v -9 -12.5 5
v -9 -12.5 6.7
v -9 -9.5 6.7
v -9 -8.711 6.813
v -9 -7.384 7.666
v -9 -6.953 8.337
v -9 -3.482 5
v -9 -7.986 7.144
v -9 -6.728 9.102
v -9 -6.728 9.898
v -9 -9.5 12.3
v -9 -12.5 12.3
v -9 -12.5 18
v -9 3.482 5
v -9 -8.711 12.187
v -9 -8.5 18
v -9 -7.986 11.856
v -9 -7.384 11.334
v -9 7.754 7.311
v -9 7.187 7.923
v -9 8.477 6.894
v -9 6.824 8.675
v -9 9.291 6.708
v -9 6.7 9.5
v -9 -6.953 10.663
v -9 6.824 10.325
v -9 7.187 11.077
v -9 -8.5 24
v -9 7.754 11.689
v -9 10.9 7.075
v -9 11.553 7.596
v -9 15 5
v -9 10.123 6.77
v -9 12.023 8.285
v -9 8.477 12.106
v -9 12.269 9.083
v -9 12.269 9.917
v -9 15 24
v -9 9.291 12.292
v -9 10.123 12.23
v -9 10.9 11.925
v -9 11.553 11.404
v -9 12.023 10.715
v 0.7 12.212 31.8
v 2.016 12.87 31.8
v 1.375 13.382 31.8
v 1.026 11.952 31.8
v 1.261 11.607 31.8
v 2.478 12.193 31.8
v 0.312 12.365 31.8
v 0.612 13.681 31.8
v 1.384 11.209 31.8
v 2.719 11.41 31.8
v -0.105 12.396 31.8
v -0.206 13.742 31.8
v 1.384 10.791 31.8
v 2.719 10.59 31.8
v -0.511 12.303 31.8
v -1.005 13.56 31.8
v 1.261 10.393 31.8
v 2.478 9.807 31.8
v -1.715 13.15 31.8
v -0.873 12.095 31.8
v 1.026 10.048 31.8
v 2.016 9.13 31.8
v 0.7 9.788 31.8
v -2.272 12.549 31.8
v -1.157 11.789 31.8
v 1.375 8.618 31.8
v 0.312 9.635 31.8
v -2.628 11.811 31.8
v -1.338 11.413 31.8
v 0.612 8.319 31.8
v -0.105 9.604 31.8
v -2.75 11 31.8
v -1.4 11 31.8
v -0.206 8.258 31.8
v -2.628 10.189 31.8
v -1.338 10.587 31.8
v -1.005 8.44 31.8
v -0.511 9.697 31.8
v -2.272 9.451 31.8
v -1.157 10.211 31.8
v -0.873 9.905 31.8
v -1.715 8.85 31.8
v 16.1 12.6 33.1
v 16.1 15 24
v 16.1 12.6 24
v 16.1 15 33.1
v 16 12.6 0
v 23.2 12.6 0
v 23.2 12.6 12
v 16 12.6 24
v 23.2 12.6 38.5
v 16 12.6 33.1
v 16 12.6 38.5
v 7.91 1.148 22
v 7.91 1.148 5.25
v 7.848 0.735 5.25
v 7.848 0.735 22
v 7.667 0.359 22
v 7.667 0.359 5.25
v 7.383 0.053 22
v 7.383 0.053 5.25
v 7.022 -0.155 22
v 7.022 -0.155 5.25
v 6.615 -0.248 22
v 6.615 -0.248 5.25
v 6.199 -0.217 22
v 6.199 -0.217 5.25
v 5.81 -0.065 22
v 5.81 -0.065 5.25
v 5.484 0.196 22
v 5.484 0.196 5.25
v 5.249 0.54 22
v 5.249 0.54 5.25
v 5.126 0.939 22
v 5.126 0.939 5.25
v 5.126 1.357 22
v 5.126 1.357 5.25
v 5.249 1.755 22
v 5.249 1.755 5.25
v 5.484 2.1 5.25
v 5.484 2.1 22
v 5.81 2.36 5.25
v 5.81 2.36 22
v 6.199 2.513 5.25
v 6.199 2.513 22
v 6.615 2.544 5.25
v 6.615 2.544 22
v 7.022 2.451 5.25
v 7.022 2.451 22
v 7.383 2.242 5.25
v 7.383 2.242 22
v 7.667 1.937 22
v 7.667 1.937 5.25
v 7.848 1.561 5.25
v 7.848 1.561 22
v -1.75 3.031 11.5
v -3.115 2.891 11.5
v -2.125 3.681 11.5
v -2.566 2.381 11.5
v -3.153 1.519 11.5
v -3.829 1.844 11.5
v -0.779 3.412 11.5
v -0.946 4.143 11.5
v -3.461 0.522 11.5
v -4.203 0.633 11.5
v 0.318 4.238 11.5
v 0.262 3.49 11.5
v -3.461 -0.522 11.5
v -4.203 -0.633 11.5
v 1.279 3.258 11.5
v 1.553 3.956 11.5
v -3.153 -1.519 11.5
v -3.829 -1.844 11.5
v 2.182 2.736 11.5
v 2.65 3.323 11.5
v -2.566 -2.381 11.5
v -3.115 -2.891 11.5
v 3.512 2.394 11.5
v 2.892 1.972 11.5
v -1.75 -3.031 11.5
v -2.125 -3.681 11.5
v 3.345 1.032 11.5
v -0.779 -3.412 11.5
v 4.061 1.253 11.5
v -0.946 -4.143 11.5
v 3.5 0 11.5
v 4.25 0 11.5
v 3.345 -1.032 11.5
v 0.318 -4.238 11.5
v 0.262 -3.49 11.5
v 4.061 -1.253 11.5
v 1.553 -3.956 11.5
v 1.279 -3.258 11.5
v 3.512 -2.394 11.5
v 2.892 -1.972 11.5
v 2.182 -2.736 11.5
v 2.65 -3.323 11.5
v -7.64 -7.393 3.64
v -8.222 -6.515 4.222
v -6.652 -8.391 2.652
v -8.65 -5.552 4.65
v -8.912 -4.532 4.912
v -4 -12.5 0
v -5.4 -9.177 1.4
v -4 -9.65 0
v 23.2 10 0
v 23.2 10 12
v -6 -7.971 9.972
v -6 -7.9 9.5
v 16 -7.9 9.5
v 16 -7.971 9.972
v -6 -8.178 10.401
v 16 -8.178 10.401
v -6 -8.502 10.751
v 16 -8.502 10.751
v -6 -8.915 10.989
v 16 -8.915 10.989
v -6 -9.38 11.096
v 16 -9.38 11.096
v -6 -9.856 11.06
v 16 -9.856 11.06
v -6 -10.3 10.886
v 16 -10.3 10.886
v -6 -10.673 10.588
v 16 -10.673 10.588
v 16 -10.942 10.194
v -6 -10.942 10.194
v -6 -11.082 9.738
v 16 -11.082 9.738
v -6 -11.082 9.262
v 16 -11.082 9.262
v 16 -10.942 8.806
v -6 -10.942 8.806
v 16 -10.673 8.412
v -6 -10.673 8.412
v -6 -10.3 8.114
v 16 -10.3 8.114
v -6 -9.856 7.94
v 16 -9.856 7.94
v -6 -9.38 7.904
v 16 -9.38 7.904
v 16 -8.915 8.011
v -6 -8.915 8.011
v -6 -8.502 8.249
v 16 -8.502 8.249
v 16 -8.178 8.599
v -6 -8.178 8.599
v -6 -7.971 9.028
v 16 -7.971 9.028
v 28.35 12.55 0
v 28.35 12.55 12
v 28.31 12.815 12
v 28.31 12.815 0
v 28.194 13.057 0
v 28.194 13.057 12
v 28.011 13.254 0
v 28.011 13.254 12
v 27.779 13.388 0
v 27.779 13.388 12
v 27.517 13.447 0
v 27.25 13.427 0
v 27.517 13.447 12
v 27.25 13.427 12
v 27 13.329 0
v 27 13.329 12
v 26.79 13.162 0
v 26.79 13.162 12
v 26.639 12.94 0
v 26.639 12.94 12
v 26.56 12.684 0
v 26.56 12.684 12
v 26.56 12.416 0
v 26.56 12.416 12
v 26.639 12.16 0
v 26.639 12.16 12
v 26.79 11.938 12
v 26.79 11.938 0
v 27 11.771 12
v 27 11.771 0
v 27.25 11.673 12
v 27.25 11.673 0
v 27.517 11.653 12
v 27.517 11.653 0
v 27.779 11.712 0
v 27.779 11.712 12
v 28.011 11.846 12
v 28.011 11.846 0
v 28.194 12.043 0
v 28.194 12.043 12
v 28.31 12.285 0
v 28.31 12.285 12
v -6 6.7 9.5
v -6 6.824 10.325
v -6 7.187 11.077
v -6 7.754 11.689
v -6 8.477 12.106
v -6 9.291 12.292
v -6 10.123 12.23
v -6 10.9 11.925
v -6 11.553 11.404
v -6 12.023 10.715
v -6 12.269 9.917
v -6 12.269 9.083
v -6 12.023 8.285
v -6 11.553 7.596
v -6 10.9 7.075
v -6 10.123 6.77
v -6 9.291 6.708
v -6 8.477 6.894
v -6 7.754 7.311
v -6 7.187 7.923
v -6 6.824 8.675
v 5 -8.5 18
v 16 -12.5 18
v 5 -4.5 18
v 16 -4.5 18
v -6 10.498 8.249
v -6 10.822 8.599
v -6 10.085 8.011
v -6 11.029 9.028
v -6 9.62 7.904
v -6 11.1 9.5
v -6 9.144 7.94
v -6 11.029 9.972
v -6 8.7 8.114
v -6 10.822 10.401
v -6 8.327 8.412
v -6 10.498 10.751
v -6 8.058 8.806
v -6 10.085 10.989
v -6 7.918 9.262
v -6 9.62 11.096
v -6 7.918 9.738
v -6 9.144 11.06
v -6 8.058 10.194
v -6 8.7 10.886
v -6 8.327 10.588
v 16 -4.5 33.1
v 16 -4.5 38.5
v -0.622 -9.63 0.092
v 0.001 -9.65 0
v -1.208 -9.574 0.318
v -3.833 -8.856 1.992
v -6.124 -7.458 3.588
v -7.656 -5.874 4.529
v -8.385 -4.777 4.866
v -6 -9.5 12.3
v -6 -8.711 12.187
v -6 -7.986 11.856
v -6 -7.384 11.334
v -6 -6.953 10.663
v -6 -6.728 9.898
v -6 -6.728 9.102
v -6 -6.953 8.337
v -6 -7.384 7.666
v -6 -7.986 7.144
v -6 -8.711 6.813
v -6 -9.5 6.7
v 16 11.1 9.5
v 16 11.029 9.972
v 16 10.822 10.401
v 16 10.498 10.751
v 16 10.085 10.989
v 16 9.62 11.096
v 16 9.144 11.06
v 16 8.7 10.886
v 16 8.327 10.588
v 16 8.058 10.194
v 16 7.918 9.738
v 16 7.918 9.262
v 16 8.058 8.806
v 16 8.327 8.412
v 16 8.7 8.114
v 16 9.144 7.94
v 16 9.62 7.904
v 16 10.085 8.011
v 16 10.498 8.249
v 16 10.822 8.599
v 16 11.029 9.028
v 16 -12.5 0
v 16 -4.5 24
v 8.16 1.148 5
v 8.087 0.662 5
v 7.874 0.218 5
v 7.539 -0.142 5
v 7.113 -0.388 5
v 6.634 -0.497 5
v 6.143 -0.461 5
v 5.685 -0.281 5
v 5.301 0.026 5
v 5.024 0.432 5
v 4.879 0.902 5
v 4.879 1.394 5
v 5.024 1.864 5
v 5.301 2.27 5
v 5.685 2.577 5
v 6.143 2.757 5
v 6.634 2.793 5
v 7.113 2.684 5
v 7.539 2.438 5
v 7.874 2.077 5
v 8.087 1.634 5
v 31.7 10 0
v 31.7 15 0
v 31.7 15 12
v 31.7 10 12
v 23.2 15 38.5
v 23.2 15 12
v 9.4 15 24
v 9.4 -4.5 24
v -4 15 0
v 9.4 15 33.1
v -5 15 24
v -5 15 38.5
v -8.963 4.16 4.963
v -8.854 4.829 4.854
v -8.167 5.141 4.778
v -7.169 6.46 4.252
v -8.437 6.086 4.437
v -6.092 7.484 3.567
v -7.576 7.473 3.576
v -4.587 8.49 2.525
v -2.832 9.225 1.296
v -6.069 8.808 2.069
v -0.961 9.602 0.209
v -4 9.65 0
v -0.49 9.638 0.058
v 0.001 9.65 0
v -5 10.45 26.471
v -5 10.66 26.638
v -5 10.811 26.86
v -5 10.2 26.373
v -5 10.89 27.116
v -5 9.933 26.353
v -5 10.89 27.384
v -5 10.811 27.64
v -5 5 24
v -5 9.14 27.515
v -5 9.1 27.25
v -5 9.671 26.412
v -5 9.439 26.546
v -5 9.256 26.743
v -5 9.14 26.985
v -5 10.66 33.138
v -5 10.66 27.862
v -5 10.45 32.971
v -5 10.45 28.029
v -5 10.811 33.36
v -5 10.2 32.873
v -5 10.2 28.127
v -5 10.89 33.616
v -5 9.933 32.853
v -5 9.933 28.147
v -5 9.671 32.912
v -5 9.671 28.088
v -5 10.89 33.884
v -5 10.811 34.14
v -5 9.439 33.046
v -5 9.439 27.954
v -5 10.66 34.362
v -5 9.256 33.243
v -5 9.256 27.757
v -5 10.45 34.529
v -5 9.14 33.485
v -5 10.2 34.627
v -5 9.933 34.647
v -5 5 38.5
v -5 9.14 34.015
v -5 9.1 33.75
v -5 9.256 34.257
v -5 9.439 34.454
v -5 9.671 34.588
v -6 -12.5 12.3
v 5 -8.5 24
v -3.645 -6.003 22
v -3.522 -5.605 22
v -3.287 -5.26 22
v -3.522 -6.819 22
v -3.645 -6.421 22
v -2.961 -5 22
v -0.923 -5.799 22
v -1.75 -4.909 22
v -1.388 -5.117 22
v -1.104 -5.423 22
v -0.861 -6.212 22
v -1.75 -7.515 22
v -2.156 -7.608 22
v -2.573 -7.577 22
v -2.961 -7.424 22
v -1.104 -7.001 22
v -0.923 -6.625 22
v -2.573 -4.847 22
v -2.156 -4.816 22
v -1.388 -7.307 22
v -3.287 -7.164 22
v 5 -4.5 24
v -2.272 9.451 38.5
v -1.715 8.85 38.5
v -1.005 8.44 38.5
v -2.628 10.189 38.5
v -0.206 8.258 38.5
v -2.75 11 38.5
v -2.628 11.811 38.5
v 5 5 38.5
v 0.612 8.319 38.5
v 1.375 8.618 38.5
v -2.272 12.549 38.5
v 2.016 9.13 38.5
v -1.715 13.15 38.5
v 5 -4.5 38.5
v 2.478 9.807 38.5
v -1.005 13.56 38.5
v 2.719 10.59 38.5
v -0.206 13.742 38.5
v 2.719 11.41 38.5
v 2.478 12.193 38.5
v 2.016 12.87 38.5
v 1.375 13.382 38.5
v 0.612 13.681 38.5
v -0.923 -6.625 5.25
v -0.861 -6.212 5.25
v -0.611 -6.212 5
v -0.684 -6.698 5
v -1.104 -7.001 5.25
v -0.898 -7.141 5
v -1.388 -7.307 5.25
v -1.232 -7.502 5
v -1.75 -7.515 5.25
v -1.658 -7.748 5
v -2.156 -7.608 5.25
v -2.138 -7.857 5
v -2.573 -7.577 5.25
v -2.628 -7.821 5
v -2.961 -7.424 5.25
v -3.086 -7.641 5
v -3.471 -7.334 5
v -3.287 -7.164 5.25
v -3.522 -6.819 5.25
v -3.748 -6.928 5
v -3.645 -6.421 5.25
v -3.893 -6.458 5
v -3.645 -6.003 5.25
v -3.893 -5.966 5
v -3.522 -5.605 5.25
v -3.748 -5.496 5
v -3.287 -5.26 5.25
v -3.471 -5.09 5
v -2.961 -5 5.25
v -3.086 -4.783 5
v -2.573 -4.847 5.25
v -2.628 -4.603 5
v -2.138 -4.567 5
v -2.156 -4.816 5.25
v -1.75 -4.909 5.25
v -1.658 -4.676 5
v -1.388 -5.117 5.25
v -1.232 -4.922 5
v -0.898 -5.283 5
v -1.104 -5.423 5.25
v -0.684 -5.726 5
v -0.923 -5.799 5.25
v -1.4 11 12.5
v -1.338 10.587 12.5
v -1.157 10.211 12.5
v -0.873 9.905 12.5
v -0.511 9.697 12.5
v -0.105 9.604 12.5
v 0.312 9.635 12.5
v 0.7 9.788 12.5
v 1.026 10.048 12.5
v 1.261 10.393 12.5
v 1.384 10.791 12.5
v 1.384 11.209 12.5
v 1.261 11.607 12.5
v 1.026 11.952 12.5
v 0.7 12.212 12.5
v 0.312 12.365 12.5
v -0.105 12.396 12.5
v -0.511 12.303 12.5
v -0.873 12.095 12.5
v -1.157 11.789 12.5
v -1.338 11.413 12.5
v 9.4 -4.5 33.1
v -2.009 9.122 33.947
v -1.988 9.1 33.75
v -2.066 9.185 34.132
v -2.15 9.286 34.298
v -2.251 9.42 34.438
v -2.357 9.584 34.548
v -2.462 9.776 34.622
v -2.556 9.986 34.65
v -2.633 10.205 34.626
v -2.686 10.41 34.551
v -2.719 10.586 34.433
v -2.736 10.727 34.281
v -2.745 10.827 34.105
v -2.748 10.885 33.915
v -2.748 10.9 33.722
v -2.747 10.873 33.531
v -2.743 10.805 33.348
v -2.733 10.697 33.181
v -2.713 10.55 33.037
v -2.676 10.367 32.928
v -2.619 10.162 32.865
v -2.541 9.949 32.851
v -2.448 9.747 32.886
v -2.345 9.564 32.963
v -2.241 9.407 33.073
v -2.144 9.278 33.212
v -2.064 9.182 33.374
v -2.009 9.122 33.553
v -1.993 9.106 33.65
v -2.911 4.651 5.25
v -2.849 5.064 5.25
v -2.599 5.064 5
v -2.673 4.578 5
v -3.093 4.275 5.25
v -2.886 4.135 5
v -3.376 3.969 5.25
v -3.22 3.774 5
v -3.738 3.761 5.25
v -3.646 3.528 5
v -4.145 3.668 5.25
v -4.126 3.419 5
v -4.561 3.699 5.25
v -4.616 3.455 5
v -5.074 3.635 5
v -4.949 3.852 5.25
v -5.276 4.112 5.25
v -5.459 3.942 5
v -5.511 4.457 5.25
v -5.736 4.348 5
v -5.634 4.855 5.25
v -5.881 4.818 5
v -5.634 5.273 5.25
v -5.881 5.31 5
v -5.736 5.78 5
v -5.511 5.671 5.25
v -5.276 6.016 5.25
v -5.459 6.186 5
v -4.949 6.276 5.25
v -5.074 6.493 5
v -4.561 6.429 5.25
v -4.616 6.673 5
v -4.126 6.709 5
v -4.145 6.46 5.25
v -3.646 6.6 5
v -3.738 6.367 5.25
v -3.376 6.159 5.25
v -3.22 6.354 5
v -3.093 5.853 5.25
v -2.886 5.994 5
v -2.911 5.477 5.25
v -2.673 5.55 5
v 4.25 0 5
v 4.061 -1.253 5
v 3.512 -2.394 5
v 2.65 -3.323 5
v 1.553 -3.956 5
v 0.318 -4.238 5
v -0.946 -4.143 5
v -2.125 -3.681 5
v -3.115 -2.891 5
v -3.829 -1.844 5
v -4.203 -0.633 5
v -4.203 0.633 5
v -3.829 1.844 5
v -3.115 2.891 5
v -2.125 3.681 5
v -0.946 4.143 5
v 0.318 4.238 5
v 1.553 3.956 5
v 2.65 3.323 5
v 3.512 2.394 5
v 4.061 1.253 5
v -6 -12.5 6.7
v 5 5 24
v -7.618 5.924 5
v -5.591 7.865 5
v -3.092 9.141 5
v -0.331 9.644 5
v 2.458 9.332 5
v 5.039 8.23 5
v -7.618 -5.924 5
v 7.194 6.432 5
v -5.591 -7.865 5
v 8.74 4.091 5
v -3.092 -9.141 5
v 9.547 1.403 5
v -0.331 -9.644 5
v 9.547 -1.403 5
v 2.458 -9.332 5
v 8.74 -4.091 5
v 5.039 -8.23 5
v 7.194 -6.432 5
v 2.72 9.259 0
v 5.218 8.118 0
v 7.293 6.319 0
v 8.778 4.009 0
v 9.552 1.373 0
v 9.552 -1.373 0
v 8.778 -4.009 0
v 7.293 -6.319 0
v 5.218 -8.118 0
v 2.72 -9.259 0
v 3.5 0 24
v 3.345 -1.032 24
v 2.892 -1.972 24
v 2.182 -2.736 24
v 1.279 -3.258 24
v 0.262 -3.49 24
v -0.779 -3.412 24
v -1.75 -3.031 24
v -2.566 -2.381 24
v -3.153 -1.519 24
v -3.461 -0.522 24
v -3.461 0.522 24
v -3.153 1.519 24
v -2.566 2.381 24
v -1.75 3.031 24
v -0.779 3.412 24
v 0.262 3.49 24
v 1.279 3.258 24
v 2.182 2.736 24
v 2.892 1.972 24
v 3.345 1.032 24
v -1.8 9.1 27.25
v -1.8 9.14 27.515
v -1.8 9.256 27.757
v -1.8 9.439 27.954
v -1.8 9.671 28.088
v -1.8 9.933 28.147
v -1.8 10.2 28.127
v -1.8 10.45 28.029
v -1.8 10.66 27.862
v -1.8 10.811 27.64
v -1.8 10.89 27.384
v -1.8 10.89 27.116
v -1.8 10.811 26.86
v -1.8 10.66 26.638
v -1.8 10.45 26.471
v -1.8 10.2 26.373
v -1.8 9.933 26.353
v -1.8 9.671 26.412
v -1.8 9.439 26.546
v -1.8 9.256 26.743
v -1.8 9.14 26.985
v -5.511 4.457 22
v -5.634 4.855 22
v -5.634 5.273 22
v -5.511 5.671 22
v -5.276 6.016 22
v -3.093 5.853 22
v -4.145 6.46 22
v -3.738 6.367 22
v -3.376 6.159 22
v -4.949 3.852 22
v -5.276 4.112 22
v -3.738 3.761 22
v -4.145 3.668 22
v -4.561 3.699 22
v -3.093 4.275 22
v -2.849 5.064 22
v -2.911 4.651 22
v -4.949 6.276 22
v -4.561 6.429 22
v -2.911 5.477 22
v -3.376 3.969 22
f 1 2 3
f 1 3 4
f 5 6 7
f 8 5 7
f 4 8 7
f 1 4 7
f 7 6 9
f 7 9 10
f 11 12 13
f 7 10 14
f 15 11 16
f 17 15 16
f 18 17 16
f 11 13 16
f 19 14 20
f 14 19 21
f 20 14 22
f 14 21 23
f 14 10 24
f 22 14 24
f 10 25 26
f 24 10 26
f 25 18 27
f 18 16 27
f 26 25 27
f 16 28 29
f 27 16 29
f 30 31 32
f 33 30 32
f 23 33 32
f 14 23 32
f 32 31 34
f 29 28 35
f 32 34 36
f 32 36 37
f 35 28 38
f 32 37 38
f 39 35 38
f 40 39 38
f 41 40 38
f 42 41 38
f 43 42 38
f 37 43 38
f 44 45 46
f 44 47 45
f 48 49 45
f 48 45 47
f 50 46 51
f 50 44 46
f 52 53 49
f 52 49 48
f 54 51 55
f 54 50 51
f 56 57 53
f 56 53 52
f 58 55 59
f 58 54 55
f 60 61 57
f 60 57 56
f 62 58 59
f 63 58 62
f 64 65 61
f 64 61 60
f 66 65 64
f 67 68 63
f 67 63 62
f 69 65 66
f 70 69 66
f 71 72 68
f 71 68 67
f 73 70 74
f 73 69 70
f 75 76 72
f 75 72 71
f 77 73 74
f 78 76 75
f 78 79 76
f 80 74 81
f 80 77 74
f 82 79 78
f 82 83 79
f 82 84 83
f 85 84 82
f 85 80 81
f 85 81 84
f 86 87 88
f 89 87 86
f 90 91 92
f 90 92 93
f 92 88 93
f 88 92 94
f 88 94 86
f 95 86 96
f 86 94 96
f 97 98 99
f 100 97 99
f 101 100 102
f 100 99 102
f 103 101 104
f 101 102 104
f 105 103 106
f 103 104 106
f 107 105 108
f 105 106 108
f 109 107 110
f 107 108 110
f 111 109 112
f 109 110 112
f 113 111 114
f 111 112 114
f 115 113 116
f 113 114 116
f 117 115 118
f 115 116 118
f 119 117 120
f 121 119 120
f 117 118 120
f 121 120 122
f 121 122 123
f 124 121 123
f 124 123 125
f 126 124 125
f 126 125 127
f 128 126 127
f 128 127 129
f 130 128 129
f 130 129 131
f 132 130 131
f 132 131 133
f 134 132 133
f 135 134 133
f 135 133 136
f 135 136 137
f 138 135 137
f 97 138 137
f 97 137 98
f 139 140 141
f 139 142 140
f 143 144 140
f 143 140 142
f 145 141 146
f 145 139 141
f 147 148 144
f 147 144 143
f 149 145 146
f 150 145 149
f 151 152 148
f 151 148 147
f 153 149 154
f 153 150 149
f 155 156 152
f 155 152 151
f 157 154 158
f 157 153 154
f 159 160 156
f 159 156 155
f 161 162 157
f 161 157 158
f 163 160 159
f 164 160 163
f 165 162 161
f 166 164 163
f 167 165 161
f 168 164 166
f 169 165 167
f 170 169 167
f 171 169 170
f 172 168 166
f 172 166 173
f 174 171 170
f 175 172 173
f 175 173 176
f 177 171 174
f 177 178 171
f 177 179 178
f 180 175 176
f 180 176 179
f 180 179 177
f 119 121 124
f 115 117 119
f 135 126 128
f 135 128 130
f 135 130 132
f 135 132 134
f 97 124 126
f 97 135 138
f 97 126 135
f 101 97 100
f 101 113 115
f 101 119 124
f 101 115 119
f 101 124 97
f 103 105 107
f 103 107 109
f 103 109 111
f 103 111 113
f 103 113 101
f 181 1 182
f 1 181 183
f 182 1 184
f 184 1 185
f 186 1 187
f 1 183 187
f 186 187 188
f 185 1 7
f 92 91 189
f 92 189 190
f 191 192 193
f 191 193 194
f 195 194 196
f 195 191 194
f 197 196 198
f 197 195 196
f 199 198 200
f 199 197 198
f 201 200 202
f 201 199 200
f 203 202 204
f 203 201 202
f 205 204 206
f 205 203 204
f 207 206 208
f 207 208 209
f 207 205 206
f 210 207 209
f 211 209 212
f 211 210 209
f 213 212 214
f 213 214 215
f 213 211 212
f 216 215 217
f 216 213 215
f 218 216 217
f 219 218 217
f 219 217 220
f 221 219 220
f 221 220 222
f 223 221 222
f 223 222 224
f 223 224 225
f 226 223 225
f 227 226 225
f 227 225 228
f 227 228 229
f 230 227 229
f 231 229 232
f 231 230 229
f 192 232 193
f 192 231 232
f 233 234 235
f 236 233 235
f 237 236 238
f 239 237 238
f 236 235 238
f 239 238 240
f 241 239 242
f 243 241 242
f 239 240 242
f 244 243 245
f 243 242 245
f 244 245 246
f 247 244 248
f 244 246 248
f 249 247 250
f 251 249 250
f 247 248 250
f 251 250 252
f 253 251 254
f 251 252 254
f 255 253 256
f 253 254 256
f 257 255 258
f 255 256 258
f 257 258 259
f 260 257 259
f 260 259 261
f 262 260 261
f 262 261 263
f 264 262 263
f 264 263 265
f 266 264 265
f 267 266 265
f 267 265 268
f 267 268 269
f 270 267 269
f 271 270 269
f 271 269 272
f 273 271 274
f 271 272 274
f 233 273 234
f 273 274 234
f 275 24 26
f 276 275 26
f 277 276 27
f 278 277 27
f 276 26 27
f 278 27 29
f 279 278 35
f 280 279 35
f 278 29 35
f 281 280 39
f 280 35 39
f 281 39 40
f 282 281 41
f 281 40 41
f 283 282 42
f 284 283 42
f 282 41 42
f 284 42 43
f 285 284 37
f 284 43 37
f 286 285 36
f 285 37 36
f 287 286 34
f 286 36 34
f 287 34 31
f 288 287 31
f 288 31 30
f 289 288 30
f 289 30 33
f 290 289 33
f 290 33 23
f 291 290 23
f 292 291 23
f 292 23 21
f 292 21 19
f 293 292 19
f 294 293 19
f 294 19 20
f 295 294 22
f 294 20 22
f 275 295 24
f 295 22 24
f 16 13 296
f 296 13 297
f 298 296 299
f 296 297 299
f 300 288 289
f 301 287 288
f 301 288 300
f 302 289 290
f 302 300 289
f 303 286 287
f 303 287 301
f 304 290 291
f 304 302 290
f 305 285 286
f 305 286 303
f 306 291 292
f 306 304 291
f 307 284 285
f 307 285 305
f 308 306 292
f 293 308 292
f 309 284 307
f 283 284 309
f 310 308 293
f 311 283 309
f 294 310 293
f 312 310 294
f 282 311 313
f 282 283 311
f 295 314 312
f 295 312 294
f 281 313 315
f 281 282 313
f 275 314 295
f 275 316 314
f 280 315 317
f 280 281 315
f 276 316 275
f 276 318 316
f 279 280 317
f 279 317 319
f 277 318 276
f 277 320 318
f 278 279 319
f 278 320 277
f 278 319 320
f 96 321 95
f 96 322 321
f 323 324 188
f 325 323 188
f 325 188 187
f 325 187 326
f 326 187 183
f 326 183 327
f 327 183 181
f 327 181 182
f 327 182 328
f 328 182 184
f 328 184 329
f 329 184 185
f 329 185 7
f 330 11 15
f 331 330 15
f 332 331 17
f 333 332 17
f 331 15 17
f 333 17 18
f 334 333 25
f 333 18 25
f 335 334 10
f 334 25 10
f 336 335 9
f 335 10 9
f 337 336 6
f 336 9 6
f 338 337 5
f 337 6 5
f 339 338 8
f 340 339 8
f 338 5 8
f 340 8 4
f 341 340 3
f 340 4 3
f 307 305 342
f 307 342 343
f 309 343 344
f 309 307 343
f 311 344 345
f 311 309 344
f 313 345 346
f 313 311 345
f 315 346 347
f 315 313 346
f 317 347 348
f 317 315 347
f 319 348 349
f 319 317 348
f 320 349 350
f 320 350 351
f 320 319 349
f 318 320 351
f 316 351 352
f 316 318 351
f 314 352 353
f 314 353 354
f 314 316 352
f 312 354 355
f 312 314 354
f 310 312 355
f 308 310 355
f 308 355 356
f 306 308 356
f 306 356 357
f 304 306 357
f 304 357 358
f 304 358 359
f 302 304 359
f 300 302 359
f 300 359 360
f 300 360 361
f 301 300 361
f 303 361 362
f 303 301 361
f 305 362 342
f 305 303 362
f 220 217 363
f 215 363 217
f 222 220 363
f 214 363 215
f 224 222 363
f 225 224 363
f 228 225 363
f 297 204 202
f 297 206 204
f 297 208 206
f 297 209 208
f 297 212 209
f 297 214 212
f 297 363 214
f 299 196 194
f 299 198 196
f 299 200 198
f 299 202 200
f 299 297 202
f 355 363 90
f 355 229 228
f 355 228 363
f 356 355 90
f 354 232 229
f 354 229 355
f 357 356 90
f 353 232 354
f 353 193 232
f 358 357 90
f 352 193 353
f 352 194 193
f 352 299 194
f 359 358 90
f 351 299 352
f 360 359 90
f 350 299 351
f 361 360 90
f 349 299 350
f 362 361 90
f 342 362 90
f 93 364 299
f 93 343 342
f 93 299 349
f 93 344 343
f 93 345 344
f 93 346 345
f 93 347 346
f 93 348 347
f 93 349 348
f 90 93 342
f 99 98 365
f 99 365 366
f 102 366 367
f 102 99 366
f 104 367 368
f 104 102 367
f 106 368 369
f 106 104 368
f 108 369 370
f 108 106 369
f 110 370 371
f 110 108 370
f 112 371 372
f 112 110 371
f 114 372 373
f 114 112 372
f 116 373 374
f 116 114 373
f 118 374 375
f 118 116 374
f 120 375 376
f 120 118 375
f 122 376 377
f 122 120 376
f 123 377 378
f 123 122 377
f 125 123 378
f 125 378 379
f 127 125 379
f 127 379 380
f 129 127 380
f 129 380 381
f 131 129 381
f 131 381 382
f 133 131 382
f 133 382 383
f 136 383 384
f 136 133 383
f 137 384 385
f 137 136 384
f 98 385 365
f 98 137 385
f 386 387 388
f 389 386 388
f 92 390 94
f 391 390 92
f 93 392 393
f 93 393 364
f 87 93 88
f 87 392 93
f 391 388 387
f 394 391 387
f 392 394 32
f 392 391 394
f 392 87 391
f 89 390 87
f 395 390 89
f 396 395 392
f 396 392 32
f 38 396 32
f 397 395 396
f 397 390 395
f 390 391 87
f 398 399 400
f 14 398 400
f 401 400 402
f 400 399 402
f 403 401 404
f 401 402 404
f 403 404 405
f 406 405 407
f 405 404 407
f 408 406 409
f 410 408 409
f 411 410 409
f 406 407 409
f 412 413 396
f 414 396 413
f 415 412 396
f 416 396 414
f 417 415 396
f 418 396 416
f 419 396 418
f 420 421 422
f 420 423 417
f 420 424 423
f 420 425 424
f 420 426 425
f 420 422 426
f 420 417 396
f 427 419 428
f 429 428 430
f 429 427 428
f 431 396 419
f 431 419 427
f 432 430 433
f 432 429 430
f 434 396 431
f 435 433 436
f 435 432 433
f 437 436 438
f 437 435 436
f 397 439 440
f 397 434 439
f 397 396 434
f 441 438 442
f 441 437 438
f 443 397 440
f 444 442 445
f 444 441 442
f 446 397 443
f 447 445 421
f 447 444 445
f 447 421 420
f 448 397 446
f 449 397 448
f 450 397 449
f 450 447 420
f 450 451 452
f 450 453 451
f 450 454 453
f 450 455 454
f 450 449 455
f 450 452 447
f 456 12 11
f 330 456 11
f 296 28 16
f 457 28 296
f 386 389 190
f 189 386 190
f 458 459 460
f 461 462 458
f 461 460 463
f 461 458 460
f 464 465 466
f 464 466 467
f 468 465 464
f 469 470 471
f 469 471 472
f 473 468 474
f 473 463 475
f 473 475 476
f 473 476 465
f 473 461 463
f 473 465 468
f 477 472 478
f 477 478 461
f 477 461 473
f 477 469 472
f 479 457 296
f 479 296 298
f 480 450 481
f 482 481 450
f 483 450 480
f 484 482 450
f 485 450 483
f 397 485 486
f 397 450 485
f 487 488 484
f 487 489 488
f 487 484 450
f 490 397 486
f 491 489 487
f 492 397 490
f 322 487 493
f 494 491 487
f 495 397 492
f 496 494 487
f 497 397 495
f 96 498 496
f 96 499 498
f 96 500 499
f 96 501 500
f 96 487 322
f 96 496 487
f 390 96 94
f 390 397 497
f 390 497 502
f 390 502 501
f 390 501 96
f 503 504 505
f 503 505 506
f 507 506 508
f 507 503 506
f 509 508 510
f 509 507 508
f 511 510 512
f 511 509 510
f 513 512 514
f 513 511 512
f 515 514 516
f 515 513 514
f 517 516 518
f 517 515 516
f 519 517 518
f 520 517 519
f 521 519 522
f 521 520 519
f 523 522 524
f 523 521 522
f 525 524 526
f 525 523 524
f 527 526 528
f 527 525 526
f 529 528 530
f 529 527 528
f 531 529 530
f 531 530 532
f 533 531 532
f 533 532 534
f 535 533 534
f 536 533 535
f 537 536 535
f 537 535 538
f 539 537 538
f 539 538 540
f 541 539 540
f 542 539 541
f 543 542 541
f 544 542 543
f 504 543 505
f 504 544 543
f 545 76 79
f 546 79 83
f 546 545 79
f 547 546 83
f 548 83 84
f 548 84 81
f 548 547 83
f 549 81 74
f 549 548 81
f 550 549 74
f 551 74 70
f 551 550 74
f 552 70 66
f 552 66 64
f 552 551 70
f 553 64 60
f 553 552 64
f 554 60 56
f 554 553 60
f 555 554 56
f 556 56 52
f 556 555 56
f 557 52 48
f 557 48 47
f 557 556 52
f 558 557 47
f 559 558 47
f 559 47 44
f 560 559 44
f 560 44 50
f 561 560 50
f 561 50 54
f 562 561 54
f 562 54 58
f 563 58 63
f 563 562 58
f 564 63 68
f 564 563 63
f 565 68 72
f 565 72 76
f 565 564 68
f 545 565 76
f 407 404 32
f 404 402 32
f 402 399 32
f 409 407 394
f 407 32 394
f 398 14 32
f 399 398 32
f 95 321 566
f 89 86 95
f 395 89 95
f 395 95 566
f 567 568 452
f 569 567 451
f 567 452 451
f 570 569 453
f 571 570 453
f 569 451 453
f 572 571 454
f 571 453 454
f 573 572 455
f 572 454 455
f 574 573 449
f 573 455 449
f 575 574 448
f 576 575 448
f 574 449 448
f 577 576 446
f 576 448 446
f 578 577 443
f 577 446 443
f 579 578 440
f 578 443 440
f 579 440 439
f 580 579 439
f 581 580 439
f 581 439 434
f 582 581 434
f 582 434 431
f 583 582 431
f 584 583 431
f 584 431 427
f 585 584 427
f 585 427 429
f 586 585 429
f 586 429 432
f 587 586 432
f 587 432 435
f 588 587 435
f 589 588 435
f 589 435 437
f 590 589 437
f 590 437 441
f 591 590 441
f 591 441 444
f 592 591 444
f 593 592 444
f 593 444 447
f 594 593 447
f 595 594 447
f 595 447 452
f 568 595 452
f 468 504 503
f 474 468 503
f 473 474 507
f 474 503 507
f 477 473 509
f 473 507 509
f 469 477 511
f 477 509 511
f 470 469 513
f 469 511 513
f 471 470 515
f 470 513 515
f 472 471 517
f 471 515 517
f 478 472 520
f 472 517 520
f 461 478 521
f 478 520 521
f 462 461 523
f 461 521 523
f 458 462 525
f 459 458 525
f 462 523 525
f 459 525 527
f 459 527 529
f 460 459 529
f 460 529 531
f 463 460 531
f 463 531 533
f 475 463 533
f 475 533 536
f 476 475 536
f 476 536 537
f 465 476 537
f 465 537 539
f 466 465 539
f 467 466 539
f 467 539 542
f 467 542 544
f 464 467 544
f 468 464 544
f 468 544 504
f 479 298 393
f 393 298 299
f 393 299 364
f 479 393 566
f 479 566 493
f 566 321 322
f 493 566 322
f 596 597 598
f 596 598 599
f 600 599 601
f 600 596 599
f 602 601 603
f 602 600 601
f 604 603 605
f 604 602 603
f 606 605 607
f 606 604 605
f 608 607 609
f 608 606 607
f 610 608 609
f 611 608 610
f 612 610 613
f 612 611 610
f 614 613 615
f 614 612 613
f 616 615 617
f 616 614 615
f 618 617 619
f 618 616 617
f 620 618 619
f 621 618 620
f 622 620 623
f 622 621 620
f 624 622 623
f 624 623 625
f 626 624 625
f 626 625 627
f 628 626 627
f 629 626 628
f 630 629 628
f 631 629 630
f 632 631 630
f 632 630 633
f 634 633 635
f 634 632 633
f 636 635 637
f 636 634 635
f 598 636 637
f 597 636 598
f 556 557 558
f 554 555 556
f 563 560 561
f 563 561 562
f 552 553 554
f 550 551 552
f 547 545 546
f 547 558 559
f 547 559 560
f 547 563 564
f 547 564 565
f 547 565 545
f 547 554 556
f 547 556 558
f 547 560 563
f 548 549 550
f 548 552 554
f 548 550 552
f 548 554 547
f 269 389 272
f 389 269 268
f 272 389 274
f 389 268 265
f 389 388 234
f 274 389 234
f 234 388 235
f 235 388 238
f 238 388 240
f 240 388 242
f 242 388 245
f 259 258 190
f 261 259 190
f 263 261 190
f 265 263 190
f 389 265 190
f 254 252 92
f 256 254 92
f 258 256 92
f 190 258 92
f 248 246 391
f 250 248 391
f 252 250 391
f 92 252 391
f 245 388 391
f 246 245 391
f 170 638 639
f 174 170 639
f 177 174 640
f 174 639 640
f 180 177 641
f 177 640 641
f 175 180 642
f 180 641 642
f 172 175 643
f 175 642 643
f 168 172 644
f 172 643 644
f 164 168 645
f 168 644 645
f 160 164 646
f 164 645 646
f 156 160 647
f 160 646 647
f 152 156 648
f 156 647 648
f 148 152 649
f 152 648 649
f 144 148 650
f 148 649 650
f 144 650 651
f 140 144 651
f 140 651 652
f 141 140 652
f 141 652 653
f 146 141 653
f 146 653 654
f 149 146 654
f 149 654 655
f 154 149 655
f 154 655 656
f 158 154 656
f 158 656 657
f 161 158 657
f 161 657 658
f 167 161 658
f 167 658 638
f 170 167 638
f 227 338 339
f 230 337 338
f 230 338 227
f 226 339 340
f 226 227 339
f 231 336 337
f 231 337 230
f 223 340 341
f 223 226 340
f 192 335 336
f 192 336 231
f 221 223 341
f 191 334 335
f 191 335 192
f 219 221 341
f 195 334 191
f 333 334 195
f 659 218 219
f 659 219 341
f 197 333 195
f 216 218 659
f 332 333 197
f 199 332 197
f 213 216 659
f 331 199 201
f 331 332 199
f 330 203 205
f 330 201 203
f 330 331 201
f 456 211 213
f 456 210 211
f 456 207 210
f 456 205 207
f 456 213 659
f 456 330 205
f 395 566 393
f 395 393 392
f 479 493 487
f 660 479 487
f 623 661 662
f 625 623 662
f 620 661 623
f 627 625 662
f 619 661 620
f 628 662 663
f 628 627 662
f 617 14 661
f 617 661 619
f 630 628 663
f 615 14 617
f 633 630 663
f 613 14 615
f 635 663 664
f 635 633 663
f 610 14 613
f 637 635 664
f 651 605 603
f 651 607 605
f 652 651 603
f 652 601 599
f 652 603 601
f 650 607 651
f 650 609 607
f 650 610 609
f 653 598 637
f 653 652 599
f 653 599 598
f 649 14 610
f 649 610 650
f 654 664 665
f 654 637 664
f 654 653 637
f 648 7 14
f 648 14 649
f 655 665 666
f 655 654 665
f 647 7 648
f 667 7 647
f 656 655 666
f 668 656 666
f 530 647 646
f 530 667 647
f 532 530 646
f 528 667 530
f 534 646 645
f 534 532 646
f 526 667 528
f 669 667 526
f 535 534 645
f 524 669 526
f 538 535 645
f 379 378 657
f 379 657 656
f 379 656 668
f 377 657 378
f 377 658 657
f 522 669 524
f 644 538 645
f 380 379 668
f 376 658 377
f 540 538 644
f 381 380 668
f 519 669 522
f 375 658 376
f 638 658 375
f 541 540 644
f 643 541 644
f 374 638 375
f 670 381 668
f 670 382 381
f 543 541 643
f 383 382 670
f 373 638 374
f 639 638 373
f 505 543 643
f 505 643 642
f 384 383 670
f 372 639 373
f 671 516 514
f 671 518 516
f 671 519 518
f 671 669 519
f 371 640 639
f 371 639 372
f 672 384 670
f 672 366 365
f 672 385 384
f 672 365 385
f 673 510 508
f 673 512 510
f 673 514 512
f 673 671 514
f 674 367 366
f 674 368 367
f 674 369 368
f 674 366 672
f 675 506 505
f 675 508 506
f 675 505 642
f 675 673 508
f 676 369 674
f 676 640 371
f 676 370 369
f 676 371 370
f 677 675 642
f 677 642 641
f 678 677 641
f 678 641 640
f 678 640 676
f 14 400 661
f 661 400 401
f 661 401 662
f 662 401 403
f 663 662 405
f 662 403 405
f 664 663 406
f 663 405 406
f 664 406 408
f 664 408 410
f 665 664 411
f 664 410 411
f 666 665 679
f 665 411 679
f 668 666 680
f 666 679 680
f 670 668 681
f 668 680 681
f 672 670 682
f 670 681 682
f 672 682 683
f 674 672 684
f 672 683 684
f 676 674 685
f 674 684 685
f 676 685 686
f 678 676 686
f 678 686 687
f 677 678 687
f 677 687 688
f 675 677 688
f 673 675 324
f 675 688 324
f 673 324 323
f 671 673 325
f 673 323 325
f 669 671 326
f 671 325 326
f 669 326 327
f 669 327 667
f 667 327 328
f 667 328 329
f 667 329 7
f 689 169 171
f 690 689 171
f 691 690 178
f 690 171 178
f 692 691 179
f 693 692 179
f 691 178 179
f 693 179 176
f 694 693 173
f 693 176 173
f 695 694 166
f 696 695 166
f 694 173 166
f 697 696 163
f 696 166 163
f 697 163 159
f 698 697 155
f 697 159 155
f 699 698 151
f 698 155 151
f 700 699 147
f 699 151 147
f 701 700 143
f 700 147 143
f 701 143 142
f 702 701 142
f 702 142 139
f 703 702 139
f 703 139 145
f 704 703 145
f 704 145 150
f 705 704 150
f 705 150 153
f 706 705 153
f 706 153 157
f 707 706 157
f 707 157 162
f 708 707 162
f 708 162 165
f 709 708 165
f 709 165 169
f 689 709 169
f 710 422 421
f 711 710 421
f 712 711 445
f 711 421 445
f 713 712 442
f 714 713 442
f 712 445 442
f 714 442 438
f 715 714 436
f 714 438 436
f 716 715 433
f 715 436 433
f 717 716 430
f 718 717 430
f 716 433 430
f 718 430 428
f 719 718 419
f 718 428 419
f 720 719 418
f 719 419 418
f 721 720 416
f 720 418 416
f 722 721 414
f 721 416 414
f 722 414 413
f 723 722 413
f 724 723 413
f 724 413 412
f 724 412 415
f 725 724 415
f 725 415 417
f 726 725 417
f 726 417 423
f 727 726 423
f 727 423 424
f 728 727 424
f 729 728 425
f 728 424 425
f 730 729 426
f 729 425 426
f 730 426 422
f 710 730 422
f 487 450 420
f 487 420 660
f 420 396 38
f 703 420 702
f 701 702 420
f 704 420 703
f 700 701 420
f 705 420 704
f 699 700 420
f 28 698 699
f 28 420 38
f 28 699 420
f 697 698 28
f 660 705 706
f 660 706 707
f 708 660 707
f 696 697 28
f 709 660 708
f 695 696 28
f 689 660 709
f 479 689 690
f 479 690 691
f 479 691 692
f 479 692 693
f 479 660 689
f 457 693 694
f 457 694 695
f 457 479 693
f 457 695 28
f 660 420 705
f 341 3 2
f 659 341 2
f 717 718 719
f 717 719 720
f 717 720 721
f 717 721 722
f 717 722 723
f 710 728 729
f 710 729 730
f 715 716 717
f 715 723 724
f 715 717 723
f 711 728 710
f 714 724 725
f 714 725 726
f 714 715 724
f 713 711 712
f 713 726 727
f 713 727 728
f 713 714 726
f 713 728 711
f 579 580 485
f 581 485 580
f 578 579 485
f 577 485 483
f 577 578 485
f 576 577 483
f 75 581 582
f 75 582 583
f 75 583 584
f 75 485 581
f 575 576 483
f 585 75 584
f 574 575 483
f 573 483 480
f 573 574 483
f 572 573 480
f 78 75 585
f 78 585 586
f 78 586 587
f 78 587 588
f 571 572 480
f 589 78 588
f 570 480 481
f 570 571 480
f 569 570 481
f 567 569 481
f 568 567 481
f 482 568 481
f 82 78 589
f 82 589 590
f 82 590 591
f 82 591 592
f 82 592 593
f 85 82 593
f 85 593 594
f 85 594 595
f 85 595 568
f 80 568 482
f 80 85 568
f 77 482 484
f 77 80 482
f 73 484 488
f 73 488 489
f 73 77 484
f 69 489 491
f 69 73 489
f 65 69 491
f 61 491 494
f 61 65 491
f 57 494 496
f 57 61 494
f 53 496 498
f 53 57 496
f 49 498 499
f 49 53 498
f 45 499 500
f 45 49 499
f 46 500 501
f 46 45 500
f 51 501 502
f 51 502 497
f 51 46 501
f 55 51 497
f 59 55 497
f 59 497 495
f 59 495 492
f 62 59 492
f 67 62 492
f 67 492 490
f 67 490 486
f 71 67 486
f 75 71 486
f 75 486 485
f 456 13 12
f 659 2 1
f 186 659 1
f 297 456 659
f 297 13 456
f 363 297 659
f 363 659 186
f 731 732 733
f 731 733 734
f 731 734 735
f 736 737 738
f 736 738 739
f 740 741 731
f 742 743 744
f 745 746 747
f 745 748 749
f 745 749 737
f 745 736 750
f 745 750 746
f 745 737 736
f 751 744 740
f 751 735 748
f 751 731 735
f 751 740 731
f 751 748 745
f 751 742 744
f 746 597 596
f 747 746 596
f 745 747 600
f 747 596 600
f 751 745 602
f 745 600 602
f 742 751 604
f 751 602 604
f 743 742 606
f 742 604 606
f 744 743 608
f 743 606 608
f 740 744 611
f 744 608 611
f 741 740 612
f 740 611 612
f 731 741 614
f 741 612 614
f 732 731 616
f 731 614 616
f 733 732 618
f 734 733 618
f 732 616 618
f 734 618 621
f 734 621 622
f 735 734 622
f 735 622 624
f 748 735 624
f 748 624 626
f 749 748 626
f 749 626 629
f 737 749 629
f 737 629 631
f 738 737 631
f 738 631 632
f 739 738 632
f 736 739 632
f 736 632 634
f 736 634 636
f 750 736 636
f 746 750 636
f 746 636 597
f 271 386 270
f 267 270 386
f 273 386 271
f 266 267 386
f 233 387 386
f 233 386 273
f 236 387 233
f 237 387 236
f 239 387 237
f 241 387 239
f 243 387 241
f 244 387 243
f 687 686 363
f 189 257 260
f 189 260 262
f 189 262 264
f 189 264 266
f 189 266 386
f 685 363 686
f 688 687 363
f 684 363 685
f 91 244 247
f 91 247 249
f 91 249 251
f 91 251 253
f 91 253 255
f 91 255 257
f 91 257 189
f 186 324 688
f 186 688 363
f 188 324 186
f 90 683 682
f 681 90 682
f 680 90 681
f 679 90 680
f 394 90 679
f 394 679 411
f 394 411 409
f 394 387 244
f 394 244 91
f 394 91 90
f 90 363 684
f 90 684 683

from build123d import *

# Parameters (mm, degrees)
F0_R          = 1.6
F1_DEPTH      = 16
F1_DEPTH_BACK = 9
F3_R          = 3.5
F3_R_2        = 1.4
F4_DEPTH      = 22
F5_DEPTH      = 16.501
F8_R          = 9.65
F9_DEPTH      = 5
F10_R         = 4.25
F11_DEPTH     = 6.5
F12_W         = 25
F12_H         = 9.1
F13_DEPTH     = 6.6
F14_R         = 2.8
F15_DEPTH     = 3
F16_W         = 8
F16_H         = 6
F16_H_2       = 9.1
F17_DEPTH     = 11
F23_W         = 8
F23_H         = 14.5
F24_DEPTH     = 25.001
F25_W         = 14
F25_H         = 9.5
F26_DEPTH     = 14.5
F28_DEPTH     = 9.0010001359
F29_W         = 14
F29_H         = 4
F30_DEPTH     = 6
F32_DEPTH     = 2.4
F33_W         = 10
F33_H         = 14.5
F34_DEPTH     = 4
F35_R         = 0.9
F36_DEPTH     = 3.2
F37_W         = 8.5
F37_H         = 12
F38_DEPTH     = 5
F39_R         = 0.9
F40_DEPTH     = 12
F41_SIZE      = 0.25
F42_T1_DEPTH  = 31.0668298797
F42_T3_DEPTH  = 28.5668298797


# Not quite as in the source:
# - a fillet or chamfer that OpenCascade refuses, or shapes differently, is made with other operations: its cross-section is extruded or revolved along the edge and cut away or added


with BuildPart() as f1:
    # F0 (on Right) → F1 (new body, two sides)
    with BuildSketch(Plane.YZ) as f1_sk:
        Polygon((-12.5, 0), (15, 0), (15, 38.5), (-10, 38.5), (-10, 24), (-12.5, 24), align=None)
        with Locations((-9.5, 9.5)):
            Circle(F0_R, mode=Mode.SUBTRACT)
        with Locations((9.5, 9.5)):
            Circle(F0_R, mode=Mode.SUBTRACT)
    extrude(amount=F1_DEPTH)
    extrude(f1_sk.sketch, amount=-F1_DEPTH_BACK)

    # F3 (on face) → F4 (cut)
    with BuildSketch(Plane(origin=(0, 0, 0), x_dir=(1, 0, 0), z_dir=(0, 0, -1))):
        Circle(F3_R)
        with Locations((-2.2609790798, 6.2119889676)):
            Circle(F3_R_2)
        with Locations((-4.2492507141, -5.0640598044)):
            Circle(F3_R_2)
        with Locations((6.5102297939, -1.1479291633)):
            Circle(F3_R_2)
    extrude(amount=-F4_DEPTH, mode=Mode.SUBTRACT)

    # F5 (cut, through all): a face of the model
    f5_faces = [f1.faces().sort_by_distance(p)[0] for p in [
        (0, 0, 22),
    ]]
    extrude(f5_faces, amount=-F5_DEPTH, mode=Mode.SUBTRACT)

    # F8 (on face) → F9 (cut)
    with BuildSketch(Plane(origin=(0, 0, 0), x_dir=(1, 0, 0), z_dir=(0, 0, -1))):
        Circle(F8_R)
    extrude(amount=-F9_DEPTH, mode=Mode.SUBTRACT)

    # F10 (on face) → F11 (cut)
    with BuildSketch(Plane(origin=(0, 0, 5), x_dir=(1, 0, 0), z_dir=(0, 0, -1))):
        Circle(F10_R)
    extrude(amount=-F11_DEPTH, mode=Mode.SUBTRACT)

    # F12 (on face) → F13 (cut)
    with BuildSketch(Plane.YZ.offset(16)):
        with Locations((2.5, 28.55)):
            Rectangle(F12_W, F12_H)
    extrude(amount=-F13_DEPTH, mode=Mode.SUBTRACT)

    # F14 (on face) → F15 (cut)
    with BuildSketch(Plane(origin=(-9, 0, 0), x_dir=(0, -1, 0), z_dir=(-1, 0, 0))):
        with Locations((-9.5, 9.5)):
            Circle(F14_R)
        with BuildLine():
            ThreePointArc((9.5, 6.7), (11.4798989873, 7.5201010127), (12.3, 9.5))
            ThreePointArc((12.3, 9.5), (11.4798989873, 11.4798989873), (9.5, 12.3))
            ThreePointArc((9.5, 12.3), (6.7, 9.5), (9.5, 6.7))
        make_face()
        with BuildLine():
            ThreePointArc((9.5, 12.3), (11.4798989873, 11.4798989873), (12.3, 9.5))
            ThreePointArc((12.3, 9.5), (11.4798989873, 7.5201010127), (9.5, 6.7))
            Line((9.5, 6.7), (12.5, 6.7))
            Line((12.5, 6.7), (12.5, 12.3))
            Line((12.5, 12.3), (9.5, 12.3))
        make_face()
    extrude(amount=-F15_DEPTH, mode=Mode.SUBTRACT)

    # F16 (on face) → F17 (cut)
    with BuildSketch(Plane.YZ.offset(16)):
        with Locations((-8.5, 21)):
            Rectangle(F16_W, F16_H)
        with Locations((-8.5, 28.55)):
            Rectangle(F16_W, F16_H_2)
    extrude(amount=-F17_DEPTH, mode=Mode.SUBTRACT)

    # F21 (on plane+point) → F22 (revolve, cut)
    with BuildSketch(Plane.XZ.offset(-11)):
        Polygon((0, 12.5), (0, 38.5), (-2.75, 38.5), (-2.75, 31.8), (-1.4, 31.8), (-1.4, 12.5), align=None)
    revolve(axis=Axis((0, 11, 25.5), (0, 0, 1)), mode=Mode.SUBTRACT)

    # F23 (on face) → F24 (cut, through all)
    with BuildSketch(Plane.YZ.offset(16)):
        with Locations((-8.5, 31.25)):
            Rectangle(F23_W, F23_H)
    extrude(amount=-F24_DEPTH, mode=Mode.SUBTRACT)

    # F25 (on face) → F26 (cut, through all)
    with BuildSketch(Plane.XY.offset(38.5)):
        with Locations((-2, 0.25)):
            Rectangle(F25_W, F25_H)
    extrude(amount=-F26_DEPTH, mode=Mode.SUBTRACT)

    # F27 (on face) → F28 (cut, through all)
    with BuildSketch(Plane(origin=(-9, 0, 0), x_dir=(0, -1, 0), z_dir=(-1, 0, 0))):
        with BuildLine():
            Line((-9.65, 0), (9.65, 0))
            ThreePointArc((9.65, 0), (7.4518594557, 3.5930041952), (3.4817380717, 5))
            Line((3.4817380717, 5), (-3.4817380717, 5))
            ThreePointArc((-3.4817380717, 5), (-7.4518594557, 3.5930041952), (-9.65, 0))
        make_face()
    extrude(amount=-F28_DEPTH, mode=Mode.SUBTRACT)

    # F29 (on face) → F30 (cut, through all)
    with BuildSketch(Plane.XY.offset(24)):
        with Locations((-2, -10.5)):
            Rectangle(F29_W, F29_H)
    extrude(amount=-F30_DEPTH, mode=Mode.SUBTRACT)

    # F31 (on face) → F32 (join)
    with BuildSketch(Plane(origin=(0, 15, 0), x_dir=(-1, 0, 0), z_dir=(0, 1, 0))):
        Polygon((-23.2, 0), (-16, 0), (-16, 24), (-16.1, 24), (-16.1, 33.1), (-16, 33.1), (-16, 38.5), (-23.2, 38.5), align=None)
    extrude(amount=-F32_DEPTH)

    # F33 (on face) → F34 (cut)
    with BuildSketch(Plane(origin=(-9, 0, 0), x_dir=(0, -1, 0), z_dir=(-1, 0, 0))):
        with Locations((-10, 31.25)):
            Rectangle(F33_W, F33_H)
    extrude(amount=-F34_DEPTH, mode=Mode.SUBTRACT)

    # F35 (on face) → F36 (cut)
    with BuildSketch(Plane(origin=(-5, 0, 0), x_dir=(0, -1, 0), z_dir=(-1, 0, 0))):
        with Locations((-10, 33.75)):
            Circle(F35_R)
        with Locations((-10, 27.25)):
            Circle(F35_R)
    extrude(amount=-F36_DEPTH, mode=Mode.SUBTRACT)

    # F37 (on face) → F38 (join)
    with BuildSketch(Plane(origin=(0, 15, 0), x_dir=(-1, 0, 0), z_dir=(0, 1, 0))):
        with Locations((-27.45, 6)):
            Rectangle(F37_W, F37_H)
    extrude(amount=-F38_DEPTH)

    # F39 (on face) → F40 (cut, through all)
    with BuildSketch(Plane.XY.offset(12)):
        with Locations((27.45, 12.55)):
            Circle(F39_R)
    extrude(amount=-F40_DEPTH, mode=Mode.SUBTRACT)

    # F41
    f41_edges = [f1.edges().sort_by_distance(p)[0] for p in [
        (-3.660979, -6.211989, 5),
        (5.11023, 1.147929, 5),
        (-5.649251, 5.06406, 5),
    ]]
    chamfer(f41_edges, length=F41_SIZE)

    # F42: chamfer of 5 on 2 edges, made by hand

    # F42_s2 → F42_t1 (cut)
    with BuildSketch(Plane.XZ.offset(-27.8584149398)):
        Polygon((-9, 5), (-4, 0), (-9, 0), align=None)
    extrude(amount=F42_T1_DEPTH, mode=Mode.SUBTRACT)

    # F42_s4 → F42_t3 (cut)
    with BuildSketch(Plane.XZ.offset(-3.2084149398)):
        Polygon((-9, 5), (-4, 0), (-9, 0), align=None)
    extrude(amount=F42_T3_DEPTH, mode=Mode.SUBTRACT)


solid = f1.part
